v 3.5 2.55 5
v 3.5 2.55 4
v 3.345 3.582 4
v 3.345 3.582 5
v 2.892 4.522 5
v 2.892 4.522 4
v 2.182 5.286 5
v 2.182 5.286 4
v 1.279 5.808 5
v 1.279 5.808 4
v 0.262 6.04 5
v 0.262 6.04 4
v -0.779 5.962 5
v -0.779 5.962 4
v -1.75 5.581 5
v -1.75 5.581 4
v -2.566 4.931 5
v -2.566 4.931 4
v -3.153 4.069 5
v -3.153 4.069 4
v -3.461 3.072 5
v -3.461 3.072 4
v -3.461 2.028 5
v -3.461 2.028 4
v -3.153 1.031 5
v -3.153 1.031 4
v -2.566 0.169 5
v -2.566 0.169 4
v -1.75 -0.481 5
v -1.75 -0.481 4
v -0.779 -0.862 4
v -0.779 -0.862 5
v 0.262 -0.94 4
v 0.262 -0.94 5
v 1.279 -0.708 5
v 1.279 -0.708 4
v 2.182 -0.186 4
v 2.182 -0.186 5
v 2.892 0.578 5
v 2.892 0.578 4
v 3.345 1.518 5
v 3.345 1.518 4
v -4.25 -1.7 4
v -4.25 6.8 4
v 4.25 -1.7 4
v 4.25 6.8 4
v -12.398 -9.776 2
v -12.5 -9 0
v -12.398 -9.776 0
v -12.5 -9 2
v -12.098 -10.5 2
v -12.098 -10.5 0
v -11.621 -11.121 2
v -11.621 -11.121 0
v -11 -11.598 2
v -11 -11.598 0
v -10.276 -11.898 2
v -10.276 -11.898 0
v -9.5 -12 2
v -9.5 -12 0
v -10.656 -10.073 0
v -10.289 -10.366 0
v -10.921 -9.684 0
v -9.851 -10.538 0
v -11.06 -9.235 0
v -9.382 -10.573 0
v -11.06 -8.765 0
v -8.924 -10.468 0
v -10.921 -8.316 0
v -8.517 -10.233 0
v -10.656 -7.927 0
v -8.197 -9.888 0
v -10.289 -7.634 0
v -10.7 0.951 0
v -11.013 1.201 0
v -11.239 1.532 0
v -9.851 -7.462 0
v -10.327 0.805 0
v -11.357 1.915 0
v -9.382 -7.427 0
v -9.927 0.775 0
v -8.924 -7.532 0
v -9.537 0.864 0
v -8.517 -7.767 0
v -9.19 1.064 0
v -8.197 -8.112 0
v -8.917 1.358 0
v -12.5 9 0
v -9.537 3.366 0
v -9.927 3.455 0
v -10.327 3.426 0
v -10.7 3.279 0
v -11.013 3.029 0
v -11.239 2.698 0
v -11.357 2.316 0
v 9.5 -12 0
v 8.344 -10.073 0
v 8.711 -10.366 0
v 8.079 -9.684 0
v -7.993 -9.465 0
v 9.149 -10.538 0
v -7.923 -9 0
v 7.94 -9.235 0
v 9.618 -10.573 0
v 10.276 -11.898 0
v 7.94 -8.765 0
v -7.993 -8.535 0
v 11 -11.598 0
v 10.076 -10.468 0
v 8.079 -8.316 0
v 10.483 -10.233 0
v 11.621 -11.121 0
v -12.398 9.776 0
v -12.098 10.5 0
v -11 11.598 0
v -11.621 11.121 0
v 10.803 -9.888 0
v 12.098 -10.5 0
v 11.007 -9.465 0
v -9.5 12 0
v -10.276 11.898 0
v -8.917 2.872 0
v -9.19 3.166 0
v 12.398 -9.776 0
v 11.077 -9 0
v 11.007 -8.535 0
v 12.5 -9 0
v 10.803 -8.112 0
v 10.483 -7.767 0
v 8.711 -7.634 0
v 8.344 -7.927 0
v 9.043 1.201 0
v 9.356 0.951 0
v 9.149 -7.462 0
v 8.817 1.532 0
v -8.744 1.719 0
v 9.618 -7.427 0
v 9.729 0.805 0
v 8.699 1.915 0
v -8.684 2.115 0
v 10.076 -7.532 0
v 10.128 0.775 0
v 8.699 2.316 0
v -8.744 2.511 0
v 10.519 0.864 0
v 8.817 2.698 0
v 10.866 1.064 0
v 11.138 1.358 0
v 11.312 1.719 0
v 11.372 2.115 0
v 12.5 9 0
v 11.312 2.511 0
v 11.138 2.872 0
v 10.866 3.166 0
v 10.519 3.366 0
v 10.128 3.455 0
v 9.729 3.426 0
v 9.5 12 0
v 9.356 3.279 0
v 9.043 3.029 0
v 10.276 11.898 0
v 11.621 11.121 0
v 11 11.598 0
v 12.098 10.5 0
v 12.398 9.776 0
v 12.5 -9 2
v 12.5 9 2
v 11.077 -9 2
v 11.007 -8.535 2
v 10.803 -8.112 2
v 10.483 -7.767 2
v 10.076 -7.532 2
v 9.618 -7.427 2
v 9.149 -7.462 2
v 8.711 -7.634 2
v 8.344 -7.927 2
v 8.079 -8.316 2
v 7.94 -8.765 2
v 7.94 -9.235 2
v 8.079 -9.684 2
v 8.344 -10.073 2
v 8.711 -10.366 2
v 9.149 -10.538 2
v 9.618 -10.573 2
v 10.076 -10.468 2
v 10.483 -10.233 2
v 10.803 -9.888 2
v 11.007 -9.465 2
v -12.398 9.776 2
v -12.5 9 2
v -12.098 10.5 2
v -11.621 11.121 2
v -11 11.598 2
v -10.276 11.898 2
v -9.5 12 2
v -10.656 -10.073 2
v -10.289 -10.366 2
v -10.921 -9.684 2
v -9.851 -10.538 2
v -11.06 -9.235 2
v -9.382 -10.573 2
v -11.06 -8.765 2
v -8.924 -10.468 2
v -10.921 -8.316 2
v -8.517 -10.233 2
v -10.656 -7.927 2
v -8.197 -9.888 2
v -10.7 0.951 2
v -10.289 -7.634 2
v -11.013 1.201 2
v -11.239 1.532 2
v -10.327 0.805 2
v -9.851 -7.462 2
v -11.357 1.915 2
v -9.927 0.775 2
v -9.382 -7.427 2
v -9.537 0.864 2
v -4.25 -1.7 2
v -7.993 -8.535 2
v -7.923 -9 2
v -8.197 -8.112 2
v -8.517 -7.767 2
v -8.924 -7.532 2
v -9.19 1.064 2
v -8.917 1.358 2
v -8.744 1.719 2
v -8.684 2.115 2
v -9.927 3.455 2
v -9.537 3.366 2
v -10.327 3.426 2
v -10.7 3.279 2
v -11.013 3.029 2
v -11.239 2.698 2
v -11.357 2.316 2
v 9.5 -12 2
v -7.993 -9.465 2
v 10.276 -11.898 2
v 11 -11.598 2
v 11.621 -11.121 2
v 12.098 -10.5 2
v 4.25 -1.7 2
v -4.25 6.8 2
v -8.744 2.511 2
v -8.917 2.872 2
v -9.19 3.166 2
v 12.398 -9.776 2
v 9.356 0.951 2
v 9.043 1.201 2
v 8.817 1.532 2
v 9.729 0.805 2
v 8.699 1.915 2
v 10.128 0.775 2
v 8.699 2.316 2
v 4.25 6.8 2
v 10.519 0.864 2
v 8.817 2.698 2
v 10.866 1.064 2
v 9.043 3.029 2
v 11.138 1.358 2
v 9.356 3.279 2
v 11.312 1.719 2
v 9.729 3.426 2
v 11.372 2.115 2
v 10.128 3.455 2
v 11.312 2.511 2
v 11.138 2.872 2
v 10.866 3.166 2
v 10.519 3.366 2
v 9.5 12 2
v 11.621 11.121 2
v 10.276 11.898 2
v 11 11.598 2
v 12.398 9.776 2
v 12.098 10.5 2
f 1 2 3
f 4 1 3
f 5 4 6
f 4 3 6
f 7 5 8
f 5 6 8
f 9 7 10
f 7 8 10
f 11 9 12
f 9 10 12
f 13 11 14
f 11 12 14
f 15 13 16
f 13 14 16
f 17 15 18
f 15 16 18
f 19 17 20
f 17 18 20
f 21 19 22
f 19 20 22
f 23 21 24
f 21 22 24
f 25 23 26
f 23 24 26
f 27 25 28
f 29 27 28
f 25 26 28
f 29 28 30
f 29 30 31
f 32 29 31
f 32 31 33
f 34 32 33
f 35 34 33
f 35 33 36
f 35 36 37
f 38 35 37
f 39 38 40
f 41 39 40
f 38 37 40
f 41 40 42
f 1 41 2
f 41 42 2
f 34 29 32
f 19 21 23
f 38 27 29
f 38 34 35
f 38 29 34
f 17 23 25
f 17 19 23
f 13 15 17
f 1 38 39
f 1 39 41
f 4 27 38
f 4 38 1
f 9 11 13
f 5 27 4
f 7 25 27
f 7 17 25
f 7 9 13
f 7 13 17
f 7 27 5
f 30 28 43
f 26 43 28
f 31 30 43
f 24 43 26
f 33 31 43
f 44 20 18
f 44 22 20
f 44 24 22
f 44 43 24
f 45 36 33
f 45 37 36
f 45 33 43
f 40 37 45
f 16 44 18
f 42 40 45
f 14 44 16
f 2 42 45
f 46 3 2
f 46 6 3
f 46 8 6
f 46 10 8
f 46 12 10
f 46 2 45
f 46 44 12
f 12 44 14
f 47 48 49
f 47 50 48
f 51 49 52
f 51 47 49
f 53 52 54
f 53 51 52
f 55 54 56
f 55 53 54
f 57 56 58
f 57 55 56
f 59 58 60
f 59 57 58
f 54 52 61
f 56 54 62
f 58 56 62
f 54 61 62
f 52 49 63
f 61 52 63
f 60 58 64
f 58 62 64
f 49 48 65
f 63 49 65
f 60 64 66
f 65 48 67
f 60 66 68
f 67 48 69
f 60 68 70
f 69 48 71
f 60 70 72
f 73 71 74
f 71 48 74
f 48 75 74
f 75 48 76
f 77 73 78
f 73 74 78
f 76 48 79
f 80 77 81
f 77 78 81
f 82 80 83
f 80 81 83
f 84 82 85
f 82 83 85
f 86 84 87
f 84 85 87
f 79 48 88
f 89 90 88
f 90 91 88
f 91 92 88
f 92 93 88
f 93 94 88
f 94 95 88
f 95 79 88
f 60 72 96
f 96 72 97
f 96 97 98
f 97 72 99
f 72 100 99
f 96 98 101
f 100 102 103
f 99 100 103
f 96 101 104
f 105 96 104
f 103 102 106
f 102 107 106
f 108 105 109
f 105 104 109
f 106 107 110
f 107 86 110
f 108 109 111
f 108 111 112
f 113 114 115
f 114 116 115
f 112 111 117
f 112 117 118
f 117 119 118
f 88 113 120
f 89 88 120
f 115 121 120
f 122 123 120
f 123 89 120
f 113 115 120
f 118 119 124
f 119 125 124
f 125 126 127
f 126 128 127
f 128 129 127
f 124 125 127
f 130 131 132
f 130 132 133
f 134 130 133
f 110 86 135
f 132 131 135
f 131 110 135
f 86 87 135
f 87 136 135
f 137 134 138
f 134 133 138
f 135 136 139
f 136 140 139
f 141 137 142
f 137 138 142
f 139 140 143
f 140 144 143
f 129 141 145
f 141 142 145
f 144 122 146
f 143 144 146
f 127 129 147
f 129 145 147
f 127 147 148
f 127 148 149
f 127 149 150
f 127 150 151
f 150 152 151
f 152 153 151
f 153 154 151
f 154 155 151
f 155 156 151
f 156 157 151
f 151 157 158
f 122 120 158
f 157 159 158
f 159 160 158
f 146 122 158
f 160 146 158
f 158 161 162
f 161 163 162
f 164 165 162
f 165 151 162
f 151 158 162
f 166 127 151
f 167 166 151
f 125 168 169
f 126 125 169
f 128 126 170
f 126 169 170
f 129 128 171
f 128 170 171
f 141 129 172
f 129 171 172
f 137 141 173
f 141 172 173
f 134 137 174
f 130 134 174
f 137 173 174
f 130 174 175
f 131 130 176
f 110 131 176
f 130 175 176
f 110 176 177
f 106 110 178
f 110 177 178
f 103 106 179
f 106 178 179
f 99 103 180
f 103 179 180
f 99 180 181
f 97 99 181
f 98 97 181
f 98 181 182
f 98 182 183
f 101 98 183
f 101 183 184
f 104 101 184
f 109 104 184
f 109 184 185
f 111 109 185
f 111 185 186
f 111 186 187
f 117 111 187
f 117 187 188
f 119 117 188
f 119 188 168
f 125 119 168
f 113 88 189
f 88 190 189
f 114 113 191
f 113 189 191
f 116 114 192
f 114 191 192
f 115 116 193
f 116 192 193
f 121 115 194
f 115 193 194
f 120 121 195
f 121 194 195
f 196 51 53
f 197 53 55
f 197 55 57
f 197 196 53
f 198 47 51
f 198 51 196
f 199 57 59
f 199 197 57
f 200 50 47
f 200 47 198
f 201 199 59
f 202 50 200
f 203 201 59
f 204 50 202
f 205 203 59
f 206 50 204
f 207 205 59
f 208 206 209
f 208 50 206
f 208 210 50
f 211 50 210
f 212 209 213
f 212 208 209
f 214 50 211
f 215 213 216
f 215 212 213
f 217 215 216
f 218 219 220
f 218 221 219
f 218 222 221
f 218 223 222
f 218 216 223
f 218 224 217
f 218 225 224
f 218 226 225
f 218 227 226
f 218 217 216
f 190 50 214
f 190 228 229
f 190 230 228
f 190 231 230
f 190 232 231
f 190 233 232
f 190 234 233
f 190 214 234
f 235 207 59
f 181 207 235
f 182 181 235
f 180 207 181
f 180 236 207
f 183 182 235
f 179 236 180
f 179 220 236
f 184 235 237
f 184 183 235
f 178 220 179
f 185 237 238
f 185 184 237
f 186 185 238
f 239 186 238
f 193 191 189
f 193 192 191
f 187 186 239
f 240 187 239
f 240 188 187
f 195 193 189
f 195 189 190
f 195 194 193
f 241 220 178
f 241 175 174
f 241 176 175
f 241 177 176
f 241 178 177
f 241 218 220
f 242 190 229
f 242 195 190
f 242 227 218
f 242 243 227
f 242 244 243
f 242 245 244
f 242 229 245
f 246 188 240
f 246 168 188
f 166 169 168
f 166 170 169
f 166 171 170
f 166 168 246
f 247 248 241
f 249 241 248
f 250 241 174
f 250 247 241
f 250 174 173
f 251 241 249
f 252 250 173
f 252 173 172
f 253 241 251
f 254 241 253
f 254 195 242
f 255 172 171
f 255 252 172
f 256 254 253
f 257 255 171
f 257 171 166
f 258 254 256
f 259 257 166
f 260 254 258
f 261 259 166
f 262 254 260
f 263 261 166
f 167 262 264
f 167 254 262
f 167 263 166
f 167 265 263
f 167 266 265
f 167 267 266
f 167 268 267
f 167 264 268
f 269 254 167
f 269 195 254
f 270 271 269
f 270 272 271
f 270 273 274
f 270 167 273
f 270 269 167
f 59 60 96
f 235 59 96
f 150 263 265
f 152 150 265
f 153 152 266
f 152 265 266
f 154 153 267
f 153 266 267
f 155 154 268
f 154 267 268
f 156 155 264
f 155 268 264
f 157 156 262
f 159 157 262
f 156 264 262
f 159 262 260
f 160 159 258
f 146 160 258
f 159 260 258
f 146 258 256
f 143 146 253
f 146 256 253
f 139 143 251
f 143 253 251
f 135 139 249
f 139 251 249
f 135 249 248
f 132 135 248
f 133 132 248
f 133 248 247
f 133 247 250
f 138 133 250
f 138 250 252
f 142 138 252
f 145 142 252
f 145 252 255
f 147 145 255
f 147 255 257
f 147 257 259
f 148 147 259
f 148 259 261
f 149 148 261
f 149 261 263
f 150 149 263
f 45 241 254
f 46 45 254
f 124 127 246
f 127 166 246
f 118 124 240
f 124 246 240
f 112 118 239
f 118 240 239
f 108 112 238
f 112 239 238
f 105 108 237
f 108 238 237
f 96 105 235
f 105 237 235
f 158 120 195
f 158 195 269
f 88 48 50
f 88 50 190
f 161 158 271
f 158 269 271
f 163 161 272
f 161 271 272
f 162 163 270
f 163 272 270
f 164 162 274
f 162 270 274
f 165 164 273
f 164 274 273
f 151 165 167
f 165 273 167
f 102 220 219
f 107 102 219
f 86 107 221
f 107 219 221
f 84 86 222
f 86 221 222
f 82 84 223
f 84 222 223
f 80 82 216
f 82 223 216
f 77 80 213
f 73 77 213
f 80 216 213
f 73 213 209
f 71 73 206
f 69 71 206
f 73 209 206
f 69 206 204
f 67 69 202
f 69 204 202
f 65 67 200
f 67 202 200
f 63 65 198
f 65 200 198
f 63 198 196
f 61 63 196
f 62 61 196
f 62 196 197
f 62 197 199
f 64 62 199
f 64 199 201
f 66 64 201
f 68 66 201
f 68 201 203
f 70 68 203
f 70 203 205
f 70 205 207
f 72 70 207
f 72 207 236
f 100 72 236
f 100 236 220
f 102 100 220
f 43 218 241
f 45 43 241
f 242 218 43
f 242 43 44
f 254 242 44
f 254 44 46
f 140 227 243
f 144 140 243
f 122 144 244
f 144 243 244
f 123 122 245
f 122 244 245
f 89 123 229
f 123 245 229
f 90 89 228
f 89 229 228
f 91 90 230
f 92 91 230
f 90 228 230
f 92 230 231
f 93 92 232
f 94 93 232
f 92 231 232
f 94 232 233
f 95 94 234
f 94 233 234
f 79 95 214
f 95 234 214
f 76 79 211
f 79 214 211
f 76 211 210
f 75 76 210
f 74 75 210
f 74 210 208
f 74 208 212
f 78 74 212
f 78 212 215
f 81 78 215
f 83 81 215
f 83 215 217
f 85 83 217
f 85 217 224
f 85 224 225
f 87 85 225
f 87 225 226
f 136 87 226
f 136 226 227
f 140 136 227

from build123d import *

# Parameters (mm, degrees)
SKETCH_1_W          = 25
SKETCH_1_H          = 24
EXTRUDE_1_DEPTH     = 2
SKETCH_2_W          = 8.5
SKETCH_2_H          = 8.5
EXTRUDE_2_DEPTH     = 2
SKETCH_3_R          = 3.5
EXTRUDE_3_DEPTH     = 1
FILLET_1_R          = 3
FILLET_2_R          = 3
FILLET_3_R          = 3
FILLET_4_R          = 3
SKETCH_5_R          = 1.34400515
SKETCH_5_R_2        = 1.577179003
CUT_EXTRUDE_1_DEPTH = 21


with BuildPart() as part:
    # 스케치1 → 보스-돌출1 (new body)
    with BuildSketch(Plane.XY):
        Rectangle(SKETCH_1_W, SKETCH_1_H)
    extrude(amount=EXTRUDE_1_DEPTH)

    # 스케치2 → 보스-돌출2 (add)
    with BuildSketch(Plane.XY.offset(2)):
        with Locations((0, 2.55)):
            Rectangle(SKETCH_2_W, SKETCH_2_H)
    extrude(amount=EXTRUDE_2_DEPTH)

    # 스케치3 → 보스-돌출3 (add)
    with BuildSketch(Plane.XY.offset(4)):
        with Locations((0, 2.55)):
            Circle(SKETCH_3_R)
    extrude(amount=EXTRUDE_3_DEPTH)

    # 필렛1
    fillet_1_edges = [part.edges().sort_by_distance(p)[0] for p in [
        (-12.5, -12, 1),
    ]]
    fillet(fillet_1_edges, radius=FILLET_1_R)

    # 필렛2
    fillet_2_edges = [part.edges().sort_by_distance(p)[0] for p in [
        (-12.5, 12, 1),
    ]]
    fillet(fillet_2_edges, radius=FILLET_2_R)

    # 필렛3
    fillet_3_edges = [part.edges().sort_by_distance(p)[0] for p in [
        (12.5, 12, 1),
    ]]
    fillet(fillet_3_edges, radius=FILLET_3_R)

    # 필렛4
    fillet_4_edges = [part.edges().sort_by_distance(p)[0] for p in [
        (12.5, -12, 1),
    ]]
    fillet(fillet_4_edges, radius=FILLET_4_R)

    # 스케치5 → 컷-돌출1 (cut)
    with BuildSketch(Plane.XY.offset(2)):
        with Locations((-10.027820436, 2.115243373)):
            Circle(SKETCH_5_R)
        with Locations((10.027820436, 2.115243373)):
            Circle(SKETCH_5_R)
        with Locations((-9.5, -9)):
            Circle(SKETCH_5_R_2)
        with Locations((9.5, -9)):
            Circle(SKETCH_5_R_2)
    extrude(amount=-CUT_EXTRUDE_1_DEPTH, mode=Mode.SUBTRACT)


solid = part.part
